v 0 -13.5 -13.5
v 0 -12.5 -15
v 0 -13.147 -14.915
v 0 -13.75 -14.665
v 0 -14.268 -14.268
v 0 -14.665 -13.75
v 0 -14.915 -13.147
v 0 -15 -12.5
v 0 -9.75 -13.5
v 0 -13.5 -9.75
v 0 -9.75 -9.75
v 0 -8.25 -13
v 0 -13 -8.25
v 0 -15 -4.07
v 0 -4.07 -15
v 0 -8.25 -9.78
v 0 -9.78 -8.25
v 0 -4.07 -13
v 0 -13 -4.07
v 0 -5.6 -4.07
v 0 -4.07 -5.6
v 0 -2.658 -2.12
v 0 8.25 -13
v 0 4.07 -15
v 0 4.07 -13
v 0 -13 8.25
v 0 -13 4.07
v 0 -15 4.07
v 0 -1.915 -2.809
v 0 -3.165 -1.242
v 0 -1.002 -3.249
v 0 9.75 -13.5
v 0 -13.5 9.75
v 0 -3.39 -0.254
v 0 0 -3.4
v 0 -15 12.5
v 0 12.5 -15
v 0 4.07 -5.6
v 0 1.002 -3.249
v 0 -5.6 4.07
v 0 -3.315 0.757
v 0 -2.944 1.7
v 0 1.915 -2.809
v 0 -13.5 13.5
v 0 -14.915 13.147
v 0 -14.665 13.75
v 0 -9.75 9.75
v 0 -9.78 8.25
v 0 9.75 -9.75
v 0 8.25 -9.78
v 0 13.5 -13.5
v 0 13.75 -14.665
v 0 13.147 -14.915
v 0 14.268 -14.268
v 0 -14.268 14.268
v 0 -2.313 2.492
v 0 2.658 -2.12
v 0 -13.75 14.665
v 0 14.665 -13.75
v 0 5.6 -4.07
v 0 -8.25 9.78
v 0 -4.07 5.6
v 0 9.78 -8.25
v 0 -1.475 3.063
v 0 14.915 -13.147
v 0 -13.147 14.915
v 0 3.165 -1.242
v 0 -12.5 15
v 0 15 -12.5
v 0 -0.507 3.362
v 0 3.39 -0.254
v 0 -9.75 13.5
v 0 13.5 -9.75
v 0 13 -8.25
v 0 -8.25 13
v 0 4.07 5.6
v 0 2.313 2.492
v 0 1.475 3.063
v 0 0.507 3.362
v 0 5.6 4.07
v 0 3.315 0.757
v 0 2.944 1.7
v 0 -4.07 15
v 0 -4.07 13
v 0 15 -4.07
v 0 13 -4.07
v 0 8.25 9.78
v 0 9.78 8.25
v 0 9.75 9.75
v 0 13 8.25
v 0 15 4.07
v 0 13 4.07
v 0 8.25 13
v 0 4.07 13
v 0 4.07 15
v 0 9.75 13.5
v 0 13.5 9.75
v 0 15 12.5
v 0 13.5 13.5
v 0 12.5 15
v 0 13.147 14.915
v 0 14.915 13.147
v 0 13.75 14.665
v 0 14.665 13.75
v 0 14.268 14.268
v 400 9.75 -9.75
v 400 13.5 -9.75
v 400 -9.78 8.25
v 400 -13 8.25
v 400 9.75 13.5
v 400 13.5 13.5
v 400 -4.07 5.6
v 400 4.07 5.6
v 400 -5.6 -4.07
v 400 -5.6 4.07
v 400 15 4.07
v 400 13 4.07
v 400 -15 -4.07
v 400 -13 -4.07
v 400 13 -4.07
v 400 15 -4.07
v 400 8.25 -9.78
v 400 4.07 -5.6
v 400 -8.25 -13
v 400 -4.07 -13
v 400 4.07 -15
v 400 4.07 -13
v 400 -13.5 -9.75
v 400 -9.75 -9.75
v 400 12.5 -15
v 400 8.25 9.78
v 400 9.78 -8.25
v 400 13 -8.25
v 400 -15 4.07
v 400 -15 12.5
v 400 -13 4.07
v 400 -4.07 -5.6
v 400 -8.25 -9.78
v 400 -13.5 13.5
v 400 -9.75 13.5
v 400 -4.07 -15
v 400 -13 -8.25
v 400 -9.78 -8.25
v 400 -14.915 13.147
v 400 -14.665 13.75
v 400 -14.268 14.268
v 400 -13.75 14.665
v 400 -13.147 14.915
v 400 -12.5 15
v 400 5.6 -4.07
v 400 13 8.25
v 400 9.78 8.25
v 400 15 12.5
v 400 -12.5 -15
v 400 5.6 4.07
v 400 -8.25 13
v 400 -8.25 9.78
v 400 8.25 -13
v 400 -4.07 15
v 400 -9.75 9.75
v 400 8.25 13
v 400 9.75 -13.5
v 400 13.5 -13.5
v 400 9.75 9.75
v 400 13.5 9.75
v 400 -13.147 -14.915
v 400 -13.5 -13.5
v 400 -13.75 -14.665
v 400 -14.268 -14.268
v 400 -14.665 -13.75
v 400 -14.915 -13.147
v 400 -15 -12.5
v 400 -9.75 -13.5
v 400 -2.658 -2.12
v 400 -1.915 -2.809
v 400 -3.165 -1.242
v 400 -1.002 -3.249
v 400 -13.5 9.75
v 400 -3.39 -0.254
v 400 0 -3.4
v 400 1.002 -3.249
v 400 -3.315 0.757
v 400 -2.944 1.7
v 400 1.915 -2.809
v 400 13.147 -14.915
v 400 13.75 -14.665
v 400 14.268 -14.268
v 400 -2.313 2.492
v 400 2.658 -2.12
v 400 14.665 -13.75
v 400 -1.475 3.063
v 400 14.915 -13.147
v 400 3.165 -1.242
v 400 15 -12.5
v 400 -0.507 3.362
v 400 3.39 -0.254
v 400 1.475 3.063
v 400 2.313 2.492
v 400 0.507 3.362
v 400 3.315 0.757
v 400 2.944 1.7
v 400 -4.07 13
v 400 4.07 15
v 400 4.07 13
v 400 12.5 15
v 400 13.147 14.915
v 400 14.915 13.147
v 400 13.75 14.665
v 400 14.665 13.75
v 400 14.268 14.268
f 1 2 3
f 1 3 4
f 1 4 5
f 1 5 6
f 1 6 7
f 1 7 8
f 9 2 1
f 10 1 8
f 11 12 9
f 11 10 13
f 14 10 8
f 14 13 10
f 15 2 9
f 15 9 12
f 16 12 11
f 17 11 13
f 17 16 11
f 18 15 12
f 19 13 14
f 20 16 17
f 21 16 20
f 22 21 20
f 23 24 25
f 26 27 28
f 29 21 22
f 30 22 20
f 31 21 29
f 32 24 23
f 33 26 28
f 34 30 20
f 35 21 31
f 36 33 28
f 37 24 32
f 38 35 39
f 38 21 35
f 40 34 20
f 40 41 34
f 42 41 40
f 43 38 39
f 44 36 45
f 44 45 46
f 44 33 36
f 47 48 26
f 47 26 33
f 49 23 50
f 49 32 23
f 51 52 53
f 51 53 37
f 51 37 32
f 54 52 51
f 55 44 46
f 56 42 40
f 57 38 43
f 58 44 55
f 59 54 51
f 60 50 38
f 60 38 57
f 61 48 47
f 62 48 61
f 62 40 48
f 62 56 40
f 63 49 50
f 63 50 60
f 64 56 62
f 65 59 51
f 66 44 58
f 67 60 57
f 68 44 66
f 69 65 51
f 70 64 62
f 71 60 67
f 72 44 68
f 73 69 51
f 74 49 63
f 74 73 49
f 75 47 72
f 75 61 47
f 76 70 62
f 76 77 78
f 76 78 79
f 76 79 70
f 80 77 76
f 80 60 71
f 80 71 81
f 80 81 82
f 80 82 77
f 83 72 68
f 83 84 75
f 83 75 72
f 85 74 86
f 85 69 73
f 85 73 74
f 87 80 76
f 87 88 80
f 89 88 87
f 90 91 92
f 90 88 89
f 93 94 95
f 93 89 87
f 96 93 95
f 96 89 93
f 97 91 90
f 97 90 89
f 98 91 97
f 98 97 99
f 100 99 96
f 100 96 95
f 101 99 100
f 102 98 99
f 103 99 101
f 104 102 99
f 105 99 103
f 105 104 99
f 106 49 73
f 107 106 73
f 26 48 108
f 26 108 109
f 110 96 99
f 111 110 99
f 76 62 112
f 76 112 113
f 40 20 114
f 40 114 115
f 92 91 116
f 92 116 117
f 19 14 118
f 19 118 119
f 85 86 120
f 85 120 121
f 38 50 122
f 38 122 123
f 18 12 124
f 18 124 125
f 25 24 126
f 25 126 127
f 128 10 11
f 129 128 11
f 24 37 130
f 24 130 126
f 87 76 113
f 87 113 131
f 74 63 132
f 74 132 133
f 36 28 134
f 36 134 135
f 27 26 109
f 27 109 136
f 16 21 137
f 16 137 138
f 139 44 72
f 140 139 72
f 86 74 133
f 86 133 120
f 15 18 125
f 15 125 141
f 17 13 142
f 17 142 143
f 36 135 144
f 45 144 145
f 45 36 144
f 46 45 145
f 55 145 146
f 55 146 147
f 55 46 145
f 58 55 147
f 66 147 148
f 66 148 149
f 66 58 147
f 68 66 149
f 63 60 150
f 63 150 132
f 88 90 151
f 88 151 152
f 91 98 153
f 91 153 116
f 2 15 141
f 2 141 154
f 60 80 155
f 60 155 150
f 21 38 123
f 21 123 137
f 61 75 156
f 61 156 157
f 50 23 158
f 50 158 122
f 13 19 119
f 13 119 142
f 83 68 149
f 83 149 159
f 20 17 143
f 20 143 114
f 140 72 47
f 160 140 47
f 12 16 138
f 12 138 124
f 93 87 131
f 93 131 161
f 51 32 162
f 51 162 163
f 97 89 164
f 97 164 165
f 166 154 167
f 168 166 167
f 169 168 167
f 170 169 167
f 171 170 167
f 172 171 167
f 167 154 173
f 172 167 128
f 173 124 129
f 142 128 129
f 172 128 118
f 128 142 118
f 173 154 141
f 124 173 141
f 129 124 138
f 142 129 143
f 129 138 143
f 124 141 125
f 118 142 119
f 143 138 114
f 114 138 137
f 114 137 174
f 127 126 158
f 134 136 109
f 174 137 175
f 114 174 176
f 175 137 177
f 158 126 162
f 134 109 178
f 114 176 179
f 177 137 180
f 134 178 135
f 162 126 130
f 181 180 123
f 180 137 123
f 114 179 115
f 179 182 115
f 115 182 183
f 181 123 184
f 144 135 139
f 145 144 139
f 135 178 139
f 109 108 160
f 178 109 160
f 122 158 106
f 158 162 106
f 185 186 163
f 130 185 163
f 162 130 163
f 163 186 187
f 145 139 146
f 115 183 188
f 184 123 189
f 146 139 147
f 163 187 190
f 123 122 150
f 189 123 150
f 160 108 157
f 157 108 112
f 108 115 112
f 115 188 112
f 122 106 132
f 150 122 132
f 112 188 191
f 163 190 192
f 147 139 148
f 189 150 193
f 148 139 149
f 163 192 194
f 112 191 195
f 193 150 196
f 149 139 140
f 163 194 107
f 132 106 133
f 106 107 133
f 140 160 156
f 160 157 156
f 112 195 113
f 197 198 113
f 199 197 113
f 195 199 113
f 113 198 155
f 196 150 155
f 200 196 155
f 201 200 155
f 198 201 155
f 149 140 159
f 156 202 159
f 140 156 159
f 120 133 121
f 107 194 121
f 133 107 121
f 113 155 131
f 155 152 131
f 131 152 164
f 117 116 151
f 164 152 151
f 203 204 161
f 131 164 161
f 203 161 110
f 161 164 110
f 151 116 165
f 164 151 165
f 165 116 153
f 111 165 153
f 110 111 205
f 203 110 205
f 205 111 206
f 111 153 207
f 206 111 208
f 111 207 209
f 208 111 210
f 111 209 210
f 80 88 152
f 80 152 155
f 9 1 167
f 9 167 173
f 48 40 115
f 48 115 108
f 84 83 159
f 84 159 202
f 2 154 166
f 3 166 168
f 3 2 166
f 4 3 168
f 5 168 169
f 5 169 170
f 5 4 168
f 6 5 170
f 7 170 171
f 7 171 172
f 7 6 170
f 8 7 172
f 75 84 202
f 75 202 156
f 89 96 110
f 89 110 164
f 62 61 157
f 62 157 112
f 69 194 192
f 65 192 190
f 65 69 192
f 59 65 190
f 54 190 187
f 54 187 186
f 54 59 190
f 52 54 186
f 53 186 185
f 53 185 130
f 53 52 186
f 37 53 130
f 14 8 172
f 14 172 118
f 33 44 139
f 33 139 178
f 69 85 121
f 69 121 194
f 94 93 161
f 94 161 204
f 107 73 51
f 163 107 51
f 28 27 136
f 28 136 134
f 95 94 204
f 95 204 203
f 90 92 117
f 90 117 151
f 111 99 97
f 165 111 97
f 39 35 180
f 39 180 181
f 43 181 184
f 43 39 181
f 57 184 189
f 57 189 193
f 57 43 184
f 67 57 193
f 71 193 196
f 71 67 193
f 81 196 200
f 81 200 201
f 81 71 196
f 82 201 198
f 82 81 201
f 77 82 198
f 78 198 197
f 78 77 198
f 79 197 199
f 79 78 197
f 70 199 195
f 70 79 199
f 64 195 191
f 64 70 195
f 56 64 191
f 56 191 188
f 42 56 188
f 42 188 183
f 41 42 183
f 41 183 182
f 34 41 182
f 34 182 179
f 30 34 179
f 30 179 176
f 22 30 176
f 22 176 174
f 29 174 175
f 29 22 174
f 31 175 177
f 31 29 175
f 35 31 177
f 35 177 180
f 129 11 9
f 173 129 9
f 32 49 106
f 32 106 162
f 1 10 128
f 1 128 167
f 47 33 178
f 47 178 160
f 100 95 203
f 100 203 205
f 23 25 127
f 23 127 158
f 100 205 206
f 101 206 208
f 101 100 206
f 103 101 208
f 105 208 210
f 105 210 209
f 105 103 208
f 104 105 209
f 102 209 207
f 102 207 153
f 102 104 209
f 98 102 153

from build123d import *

# Parameters (mm, degrees)
SKETCH17_R                     = 3.4
SKETCH17_W                     = 3.75
SKETCH17_H                     = 3.75
T_SLOT_PROFILES_3030_2_1_DEPTH = 400


with BuildPart() as part:
    # Sketch17 → T-slot profiles 3030_2(1) (new body)
    with BuildSketch(Plane(origin=(0, 0, 0), x_dir=(0, 0, -1), z_dir=(1, 0, 0))):
        with BuildLine():
            Line((-4.07, 5.6), (4.07, 5.6))
            Line((4.07, 5.6), (8.25, 9.78))
            Line((8.25, 9.78), (8.25, 13))
            Line((8.25, 13), (4.07, 13))
            Line((4.07, 13), (4.07, 15))
            Line((4.07, 15), (12.5, 15))
            ThreePointArc((12.5, 15), (14.267766953, 14.267766953), (15, 12.5))
            Line((15, 12.5), (15, 4.07))
            Line((15, 4.07), (13, 4.07))
            Line((13, 4.07), (13, 8.25))
            Line((13, 8.25), (9.78, 8.25))
            Line((9.78, 8.25), (5.6, 4.07))
            Line((5.6, 4.07), (5.6, -4.07))
            Line((5.6, -4.07), (9.78, -8.25))
            Line((9.78, -8.25), (13, -8.25))
            Line((13, -8.25), (13, -4.07))
            Line((13, -4.07), (15, -4.07))
            Line((15, -4.07), (15, -12.5))
            ThreePointArc((15, -12.5), (14.267766953, -14.267766953), (12.5, -15))
            Line((12.5, -15), (4.07, -15))
            Line((4.07, -15), (4.07, -13))
            Line((4.07, -13), (8.25, -13))
            Line((8.25, -13), (8.25, -9.78))
            Line((8.25, -9.78), (4.07, -5.6))
            Line((4.07, -5.6), (-4.07, -5.6))
            Line((-4.07, -5.6), (-8.25, -9.78))
            Line((-8.25, -9.78), (-8.25, -13))
            Line((-8.25, -13), (-4.07, -13))
            Line((-4.07, -13), (-4.07, -15))
            Line((-4.07, -15), (-12.5, -15))
            ThreePointArc((-12.5, -15), (-14.267766953, -14.267766953), (-15, -12.5))
            Line((-15, -12.5), (-15, -4.07))
            Line((-15, -4.07), (-13, -4.07))
            Line((-13, -4.07), (-13, -8.25))
            Line((-13, -8.25), (-9.78, -8.25))
            Line((-9.78, -8.25), (-5.6, -4.07))
            Line((-5.6, -4.07), (-5.6, 4.07))
            Line((-5.6, 4.07), (-9.78, 8.25))
            Line((-9.78, 8.25), (-13, 8.25))
            Line((-13, 8.25), (-13, 4.07))
            Line((-13, 4.07), (-15, 4.07))
            Line((-15, 4.07), (-15, 12.5))
            ThreePointArc((-15, 12.5), (-14.267766953, 14.267766953), (-12.5, 15))
            Line((-12.5, 15), (-4.07, 15))
            Line((-4.07, 15), (-4.07, 13))
            Line((-4.07, 13), (-8.25, 13))
            Line((-8.25, 13), (-8.25, 9.78))
            Line((-8.25, 9.78), (-4.07, 5.6))
        make_face()
        Circle(SKETCH17_R, mode=Mode.SUBTRACT)
        with Locations((11.625, 11.625)):
            Rectangle(SKETCH17_W, SKETCH17_H, mode=Mode.SUBTRACT)
        with Locations((11.625, -11.625)):
            Rectangle(SKETCH17_W, SKETCH17_H, mode=Mode.SUBTRACT)
        with Locations((-11.625, 11.625)):
            Rectangle(SKETCH17_W, SKETCH17_H, mode=Mode.SUBTRACT)
        with Locations((-11.625, -11.625)):
            Rectangle(SKETCH17_W, SKETCH17_H, mode=Mode.SUBTRACT)
    extrude(amount=T_SLOT_PROFILES_3030_2_1_DEPTH)


solid = part.part
